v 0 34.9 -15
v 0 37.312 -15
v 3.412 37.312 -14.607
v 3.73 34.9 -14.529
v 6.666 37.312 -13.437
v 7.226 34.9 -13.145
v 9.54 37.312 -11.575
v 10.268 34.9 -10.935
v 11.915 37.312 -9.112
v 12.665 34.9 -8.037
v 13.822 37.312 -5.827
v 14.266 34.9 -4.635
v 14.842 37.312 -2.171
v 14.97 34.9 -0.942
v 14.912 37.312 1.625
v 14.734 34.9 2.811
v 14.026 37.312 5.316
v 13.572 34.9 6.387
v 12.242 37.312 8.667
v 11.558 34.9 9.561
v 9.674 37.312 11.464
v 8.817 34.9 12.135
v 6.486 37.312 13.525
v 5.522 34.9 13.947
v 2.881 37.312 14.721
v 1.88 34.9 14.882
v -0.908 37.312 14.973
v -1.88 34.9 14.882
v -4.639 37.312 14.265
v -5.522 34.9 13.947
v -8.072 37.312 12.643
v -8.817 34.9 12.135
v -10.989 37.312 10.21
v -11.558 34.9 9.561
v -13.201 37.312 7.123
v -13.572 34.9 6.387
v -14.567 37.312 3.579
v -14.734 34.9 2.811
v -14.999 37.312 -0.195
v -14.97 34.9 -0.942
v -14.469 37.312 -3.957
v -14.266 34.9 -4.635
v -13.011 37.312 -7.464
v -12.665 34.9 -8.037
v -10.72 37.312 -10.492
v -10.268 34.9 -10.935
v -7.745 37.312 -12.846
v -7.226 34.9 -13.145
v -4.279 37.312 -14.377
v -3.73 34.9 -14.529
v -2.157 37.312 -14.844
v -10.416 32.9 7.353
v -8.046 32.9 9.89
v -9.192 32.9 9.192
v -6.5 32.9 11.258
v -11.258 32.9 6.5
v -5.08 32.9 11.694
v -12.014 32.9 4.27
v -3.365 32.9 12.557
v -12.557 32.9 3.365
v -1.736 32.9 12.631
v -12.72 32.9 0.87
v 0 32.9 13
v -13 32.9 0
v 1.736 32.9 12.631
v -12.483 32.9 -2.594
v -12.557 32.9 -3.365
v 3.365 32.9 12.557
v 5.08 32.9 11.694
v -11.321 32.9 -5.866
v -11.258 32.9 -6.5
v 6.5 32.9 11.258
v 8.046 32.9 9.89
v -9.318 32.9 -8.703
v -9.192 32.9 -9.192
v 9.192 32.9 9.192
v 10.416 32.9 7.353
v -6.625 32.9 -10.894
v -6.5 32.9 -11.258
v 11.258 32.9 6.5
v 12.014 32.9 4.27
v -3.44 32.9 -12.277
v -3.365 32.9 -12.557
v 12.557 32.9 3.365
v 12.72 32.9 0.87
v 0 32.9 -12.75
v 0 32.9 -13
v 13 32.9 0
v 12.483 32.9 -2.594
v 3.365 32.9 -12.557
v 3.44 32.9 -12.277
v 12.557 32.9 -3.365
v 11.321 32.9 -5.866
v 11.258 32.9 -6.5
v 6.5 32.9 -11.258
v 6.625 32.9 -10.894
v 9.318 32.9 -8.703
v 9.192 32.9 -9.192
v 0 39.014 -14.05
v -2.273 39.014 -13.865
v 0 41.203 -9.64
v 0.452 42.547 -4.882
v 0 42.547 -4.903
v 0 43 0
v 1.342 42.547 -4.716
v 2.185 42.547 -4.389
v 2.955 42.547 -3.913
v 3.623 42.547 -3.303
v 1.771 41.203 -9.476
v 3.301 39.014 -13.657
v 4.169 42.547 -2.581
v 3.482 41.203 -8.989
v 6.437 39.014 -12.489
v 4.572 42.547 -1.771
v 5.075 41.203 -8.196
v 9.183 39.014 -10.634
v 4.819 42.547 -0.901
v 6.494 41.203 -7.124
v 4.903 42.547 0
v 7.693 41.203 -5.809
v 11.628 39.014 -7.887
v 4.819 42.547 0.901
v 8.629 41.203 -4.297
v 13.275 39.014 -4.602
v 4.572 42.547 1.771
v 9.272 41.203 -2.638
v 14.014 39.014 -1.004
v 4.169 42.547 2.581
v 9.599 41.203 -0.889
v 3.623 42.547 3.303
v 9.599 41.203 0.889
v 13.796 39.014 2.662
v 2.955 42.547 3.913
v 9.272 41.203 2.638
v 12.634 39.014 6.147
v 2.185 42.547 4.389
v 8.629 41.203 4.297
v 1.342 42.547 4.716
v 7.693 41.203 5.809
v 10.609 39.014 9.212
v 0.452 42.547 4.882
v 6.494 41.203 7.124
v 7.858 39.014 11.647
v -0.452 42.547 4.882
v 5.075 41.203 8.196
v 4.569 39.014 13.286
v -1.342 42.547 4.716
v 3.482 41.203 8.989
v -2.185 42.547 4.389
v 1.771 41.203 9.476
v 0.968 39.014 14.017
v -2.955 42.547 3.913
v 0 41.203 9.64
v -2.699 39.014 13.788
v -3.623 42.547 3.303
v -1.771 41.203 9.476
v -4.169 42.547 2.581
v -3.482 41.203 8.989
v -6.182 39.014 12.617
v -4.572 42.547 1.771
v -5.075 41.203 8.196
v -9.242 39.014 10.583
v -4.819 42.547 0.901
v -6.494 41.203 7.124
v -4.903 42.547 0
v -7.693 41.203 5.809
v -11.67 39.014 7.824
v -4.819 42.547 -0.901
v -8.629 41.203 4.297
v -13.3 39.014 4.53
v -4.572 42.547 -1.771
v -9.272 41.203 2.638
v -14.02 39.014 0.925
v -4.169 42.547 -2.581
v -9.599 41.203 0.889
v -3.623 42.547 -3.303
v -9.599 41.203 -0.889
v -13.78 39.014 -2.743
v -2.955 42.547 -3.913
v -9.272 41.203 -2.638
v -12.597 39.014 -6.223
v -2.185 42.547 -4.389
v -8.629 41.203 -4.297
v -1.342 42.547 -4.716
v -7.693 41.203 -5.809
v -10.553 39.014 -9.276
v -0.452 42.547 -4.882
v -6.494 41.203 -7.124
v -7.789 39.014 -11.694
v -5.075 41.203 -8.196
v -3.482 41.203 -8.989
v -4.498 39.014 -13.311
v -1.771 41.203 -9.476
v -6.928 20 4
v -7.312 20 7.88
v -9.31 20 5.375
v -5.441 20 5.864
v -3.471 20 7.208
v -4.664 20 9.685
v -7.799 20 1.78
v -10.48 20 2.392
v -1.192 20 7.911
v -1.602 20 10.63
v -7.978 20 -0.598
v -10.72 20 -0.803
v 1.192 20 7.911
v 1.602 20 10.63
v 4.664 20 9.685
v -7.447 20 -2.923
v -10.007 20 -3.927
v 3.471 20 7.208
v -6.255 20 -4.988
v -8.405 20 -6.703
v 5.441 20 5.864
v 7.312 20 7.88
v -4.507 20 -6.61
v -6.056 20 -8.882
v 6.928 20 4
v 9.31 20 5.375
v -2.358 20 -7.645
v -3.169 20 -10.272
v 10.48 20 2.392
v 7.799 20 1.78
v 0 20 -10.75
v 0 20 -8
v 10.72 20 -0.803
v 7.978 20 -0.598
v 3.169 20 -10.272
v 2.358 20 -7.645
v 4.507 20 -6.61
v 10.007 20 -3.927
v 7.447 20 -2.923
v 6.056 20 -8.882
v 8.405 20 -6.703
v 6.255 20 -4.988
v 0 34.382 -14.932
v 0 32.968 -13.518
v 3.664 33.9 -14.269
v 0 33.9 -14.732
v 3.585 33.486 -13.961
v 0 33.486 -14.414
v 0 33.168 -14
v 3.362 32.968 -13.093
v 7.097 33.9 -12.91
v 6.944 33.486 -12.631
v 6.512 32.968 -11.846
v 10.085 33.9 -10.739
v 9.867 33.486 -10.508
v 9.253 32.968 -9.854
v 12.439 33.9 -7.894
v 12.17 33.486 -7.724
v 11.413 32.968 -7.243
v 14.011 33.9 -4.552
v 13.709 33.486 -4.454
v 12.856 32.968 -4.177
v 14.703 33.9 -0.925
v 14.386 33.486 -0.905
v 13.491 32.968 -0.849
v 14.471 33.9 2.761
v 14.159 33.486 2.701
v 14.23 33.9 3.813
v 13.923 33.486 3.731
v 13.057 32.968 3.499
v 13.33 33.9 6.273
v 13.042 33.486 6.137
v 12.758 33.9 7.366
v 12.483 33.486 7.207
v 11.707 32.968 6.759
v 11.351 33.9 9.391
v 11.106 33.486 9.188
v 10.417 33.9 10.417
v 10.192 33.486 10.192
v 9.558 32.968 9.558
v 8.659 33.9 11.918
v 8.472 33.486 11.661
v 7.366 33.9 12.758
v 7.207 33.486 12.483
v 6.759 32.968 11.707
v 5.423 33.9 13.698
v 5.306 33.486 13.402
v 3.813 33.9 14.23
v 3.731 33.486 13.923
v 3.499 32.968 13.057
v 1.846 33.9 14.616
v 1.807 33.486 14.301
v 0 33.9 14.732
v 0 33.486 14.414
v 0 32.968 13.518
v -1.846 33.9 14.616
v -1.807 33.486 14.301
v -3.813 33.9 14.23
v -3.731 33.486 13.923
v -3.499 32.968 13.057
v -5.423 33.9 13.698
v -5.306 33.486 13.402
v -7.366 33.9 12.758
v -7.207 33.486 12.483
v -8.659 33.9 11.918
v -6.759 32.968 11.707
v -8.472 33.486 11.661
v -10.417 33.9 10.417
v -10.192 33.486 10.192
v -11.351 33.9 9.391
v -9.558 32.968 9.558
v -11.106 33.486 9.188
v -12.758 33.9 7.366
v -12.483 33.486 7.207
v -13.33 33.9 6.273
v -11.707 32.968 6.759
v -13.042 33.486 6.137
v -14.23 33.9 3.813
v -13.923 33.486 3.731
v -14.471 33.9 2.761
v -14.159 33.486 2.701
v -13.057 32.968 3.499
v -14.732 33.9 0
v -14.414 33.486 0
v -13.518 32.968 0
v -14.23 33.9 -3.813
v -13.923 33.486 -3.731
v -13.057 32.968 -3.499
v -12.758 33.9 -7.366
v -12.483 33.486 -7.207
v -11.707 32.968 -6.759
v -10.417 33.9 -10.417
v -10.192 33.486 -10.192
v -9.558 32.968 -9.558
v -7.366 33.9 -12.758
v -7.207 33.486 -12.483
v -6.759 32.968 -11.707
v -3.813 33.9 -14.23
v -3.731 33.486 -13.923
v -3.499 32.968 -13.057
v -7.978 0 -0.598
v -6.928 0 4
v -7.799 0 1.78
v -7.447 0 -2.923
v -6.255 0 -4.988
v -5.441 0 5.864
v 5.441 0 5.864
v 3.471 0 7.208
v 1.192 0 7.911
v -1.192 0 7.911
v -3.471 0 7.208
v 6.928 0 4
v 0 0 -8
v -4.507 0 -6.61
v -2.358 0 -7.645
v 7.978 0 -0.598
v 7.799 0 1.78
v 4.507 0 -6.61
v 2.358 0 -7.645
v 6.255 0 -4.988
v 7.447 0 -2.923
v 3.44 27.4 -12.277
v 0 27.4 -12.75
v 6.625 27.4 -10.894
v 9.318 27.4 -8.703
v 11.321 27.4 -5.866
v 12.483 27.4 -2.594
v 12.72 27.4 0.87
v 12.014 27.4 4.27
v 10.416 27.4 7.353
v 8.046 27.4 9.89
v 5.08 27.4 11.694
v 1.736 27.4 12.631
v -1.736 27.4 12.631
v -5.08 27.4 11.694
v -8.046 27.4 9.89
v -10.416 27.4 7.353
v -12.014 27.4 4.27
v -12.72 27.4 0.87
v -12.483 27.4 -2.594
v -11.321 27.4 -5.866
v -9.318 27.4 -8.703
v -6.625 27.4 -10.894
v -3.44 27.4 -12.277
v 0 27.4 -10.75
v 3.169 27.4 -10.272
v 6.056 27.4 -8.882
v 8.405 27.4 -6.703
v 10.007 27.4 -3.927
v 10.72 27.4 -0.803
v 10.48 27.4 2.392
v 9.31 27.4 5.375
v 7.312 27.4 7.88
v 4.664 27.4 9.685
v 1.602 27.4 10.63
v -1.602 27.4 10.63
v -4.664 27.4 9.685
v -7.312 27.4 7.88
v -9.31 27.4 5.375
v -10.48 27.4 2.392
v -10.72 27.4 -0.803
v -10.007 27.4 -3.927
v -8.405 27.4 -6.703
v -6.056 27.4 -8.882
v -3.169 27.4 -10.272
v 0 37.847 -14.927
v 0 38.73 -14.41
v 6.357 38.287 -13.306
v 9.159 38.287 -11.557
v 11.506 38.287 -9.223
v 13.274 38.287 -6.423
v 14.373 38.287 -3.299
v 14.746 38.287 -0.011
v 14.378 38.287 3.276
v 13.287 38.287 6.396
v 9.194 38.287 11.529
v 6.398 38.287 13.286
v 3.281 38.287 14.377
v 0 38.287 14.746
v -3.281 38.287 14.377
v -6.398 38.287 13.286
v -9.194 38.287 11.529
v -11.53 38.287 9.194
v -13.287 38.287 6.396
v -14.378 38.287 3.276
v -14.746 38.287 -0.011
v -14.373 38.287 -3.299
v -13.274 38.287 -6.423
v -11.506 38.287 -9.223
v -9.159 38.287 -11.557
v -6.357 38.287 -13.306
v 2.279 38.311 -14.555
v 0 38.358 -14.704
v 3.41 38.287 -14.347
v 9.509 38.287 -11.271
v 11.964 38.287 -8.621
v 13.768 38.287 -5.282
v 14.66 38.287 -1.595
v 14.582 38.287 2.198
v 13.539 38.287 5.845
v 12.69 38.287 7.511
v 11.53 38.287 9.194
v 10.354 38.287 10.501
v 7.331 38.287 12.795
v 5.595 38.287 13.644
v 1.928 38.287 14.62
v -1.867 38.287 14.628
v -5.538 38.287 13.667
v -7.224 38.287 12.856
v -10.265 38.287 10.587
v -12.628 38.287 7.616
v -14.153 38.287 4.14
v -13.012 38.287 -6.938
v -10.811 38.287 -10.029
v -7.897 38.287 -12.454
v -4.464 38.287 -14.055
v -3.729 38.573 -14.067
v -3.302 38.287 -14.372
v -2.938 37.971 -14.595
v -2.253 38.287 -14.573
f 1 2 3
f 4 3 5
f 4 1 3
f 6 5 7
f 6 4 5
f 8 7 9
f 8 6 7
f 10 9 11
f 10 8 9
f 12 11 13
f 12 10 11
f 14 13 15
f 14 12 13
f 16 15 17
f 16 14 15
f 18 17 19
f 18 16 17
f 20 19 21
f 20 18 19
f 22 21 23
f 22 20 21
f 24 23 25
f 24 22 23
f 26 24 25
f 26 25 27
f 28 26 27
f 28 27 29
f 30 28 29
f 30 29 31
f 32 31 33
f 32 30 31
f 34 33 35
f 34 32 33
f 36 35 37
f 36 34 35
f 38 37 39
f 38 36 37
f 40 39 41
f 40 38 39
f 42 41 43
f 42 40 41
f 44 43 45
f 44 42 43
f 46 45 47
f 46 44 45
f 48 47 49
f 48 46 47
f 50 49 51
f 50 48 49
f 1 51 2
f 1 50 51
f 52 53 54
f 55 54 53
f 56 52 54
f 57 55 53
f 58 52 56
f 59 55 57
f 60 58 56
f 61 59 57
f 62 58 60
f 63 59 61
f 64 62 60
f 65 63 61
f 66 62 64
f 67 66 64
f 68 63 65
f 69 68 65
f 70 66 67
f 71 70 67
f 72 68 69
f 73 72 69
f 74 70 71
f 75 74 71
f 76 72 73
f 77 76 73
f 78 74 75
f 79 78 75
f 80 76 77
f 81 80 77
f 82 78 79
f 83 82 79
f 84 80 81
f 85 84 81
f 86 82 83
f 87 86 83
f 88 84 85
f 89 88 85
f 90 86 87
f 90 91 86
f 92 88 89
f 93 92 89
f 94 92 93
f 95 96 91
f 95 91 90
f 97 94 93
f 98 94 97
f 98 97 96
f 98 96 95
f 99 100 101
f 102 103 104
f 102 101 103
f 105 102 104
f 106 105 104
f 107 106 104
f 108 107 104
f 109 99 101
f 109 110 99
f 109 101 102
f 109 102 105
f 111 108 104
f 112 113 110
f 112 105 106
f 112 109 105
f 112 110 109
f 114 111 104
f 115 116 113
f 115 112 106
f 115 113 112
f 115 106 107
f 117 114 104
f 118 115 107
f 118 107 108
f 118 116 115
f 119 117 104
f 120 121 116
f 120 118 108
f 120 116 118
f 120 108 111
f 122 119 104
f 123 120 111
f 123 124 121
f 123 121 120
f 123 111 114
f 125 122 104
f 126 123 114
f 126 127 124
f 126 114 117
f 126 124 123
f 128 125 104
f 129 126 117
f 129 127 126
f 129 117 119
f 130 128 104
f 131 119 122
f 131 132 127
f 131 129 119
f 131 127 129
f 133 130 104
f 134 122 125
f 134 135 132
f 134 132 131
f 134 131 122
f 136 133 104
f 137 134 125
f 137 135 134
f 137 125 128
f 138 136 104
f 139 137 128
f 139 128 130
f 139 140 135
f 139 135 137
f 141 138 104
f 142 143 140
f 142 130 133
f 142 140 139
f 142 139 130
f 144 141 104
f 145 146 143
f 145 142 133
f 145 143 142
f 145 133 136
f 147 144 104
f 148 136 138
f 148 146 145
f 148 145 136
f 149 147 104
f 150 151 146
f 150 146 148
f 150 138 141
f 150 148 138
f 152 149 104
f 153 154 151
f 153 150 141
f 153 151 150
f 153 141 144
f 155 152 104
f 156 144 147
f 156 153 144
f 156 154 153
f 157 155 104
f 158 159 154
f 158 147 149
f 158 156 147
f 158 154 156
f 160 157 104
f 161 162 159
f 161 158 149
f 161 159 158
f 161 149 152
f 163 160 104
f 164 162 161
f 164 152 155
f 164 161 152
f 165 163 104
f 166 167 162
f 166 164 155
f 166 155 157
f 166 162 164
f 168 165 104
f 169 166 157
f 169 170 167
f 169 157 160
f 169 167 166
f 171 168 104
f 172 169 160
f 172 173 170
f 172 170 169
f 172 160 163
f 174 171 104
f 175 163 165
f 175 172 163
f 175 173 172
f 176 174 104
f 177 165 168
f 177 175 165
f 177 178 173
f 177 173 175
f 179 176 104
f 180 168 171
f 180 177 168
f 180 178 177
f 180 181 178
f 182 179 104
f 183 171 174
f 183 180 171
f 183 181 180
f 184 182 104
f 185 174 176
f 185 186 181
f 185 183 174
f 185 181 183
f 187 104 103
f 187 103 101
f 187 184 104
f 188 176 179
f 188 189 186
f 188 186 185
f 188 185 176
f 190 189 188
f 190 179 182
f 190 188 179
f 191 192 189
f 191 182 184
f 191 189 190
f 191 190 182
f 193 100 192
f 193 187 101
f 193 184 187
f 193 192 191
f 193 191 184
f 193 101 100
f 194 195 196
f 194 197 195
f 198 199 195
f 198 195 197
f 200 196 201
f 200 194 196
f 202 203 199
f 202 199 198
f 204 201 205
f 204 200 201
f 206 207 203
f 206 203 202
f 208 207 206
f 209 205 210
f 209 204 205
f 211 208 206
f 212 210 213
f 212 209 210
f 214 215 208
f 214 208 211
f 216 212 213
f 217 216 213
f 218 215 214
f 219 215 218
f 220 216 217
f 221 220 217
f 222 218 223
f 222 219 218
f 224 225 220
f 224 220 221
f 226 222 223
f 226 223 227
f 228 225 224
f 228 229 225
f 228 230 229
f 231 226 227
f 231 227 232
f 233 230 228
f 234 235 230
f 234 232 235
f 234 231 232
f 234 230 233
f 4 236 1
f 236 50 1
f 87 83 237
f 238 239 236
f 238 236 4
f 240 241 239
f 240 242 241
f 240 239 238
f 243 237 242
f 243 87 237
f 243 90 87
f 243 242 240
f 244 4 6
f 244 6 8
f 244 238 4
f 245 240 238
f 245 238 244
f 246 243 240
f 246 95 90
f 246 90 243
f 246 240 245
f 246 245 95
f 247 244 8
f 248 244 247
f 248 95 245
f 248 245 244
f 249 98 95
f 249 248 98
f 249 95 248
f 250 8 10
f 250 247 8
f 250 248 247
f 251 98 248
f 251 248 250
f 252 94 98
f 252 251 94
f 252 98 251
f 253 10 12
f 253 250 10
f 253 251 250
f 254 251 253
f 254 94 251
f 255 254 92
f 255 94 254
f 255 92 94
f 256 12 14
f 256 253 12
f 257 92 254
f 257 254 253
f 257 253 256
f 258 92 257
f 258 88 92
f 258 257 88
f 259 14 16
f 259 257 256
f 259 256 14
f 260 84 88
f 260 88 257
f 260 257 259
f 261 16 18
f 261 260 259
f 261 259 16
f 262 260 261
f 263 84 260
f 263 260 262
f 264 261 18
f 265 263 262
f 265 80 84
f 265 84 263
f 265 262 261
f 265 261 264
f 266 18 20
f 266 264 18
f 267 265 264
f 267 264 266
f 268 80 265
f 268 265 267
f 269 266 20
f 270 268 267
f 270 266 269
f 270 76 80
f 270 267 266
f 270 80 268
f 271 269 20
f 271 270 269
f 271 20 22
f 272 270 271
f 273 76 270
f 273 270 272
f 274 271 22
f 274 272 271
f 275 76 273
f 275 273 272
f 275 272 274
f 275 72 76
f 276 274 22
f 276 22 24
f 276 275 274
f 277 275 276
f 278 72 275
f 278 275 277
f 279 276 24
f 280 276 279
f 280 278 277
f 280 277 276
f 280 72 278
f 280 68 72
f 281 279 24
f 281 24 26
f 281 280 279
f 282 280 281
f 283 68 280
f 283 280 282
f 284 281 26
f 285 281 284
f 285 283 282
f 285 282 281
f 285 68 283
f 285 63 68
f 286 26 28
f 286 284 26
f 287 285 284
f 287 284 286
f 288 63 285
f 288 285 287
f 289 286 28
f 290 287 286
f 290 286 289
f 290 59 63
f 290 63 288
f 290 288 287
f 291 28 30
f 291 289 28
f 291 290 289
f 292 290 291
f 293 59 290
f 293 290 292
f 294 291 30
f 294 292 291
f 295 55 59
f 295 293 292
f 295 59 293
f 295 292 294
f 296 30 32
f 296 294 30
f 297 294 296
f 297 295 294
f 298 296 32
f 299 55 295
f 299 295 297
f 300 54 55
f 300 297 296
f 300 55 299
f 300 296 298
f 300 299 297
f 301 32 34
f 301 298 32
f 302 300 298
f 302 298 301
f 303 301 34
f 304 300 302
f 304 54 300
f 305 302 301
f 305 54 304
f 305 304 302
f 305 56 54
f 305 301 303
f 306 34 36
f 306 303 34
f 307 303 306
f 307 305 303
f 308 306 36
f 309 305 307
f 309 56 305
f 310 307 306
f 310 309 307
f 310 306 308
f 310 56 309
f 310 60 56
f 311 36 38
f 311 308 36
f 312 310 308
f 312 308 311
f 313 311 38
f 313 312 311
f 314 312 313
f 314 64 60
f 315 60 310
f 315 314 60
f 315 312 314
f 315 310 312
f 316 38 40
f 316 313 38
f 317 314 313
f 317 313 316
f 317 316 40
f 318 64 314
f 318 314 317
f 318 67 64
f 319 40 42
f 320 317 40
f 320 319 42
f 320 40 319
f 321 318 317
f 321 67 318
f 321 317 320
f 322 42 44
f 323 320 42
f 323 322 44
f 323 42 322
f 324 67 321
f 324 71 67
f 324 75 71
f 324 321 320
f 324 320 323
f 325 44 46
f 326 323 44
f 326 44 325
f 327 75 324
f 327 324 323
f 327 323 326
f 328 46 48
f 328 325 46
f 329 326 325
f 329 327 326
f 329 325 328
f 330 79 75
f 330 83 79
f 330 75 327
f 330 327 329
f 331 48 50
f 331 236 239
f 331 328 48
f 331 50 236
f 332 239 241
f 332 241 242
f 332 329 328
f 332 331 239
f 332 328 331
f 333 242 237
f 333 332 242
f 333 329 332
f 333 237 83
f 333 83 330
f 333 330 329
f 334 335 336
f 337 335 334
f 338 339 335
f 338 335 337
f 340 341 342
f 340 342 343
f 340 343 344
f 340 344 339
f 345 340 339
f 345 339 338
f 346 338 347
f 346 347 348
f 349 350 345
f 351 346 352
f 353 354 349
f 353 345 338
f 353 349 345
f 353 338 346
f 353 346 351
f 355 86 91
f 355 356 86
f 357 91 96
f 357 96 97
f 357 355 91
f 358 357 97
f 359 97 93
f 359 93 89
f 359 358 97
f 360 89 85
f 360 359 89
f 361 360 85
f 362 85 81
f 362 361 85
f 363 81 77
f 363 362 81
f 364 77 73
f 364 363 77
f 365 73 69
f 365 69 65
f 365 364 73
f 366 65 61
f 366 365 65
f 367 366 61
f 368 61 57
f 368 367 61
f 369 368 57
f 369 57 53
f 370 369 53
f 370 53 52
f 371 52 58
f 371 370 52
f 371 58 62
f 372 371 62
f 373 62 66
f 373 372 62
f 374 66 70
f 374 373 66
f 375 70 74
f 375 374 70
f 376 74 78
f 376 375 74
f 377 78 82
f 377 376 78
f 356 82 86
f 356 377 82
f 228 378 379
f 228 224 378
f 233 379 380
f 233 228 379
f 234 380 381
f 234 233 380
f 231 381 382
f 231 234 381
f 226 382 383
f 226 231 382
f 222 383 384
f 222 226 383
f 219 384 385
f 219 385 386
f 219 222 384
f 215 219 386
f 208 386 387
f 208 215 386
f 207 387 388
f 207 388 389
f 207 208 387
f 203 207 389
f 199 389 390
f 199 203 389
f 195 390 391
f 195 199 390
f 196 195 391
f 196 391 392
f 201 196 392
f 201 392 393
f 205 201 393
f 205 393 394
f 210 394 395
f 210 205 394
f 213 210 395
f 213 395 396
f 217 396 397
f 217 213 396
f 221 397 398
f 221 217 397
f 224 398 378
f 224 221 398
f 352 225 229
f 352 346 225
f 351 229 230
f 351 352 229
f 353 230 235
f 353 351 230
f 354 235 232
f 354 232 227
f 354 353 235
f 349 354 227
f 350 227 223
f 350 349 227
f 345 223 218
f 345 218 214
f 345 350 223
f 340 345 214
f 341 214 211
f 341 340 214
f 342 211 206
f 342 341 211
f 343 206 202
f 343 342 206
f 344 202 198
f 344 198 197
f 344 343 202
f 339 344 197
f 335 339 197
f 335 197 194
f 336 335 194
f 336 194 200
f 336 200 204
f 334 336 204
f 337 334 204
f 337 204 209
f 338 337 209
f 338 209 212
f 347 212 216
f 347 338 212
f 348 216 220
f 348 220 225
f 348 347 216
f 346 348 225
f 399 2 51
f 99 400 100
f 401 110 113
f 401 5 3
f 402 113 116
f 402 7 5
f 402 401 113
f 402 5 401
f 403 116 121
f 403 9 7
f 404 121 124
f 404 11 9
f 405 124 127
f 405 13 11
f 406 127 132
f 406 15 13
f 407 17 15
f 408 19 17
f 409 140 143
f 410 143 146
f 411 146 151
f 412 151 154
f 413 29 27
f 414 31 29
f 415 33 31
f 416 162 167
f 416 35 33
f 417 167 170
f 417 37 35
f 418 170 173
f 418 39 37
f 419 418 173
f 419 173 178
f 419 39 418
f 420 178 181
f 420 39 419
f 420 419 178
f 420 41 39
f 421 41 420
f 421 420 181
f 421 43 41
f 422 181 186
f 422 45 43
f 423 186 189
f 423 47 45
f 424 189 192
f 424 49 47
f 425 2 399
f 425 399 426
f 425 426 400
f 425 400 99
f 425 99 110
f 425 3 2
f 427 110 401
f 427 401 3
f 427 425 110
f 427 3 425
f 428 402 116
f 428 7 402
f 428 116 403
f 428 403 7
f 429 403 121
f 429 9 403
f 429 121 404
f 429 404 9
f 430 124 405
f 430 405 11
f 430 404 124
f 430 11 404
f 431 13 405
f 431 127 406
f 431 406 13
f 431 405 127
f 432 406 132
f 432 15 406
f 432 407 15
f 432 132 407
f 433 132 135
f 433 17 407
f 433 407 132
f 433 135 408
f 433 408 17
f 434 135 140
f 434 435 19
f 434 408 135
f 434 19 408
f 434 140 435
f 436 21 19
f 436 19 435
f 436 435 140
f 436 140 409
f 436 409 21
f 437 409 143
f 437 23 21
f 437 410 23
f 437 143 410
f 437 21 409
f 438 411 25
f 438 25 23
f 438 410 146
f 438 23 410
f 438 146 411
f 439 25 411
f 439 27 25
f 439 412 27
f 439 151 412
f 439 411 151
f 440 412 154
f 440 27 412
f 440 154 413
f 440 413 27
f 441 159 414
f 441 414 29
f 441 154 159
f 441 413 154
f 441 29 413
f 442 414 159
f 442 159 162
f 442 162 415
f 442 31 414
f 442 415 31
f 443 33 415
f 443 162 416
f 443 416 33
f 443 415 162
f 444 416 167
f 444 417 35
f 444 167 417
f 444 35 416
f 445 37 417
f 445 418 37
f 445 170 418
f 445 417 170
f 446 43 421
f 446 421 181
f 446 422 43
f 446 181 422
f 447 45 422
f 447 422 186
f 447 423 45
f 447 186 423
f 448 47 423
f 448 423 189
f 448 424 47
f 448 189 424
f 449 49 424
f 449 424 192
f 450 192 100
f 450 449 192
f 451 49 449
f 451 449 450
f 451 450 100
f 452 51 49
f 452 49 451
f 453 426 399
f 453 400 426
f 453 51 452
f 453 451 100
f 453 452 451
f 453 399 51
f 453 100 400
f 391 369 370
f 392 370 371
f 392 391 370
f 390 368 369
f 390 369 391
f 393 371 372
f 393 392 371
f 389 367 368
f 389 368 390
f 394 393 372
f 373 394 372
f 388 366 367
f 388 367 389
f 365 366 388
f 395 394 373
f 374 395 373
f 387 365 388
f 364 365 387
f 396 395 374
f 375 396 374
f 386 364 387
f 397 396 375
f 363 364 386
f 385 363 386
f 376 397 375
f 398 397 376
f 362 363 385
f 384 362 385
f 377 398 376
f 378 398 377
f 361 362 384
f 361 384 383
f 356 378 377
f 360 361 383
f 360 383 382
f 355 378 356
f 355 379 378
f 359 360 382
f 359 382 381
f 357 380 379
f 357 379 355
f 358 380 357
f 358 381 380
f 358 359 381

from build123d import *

# Parameters (mm, degrees)
FILLET1_R = 2


with BuildPart() as part:
    # Sketch1 → Revolve1 (revolve)
    with BuildSketch(Plane(origin=(0, 0, 0), x_dir=(0, 0, -1), z_dir=(1, 0, 0))):
        with BuildLine():
            Line((15, 38.4), (15, 32.9))
            Line((15, 32.9), (12.75, 32.9))
            Line((12.75, 32.9), (12.75, 27.4))
            Line((12.75, 27.4), (10.75, 27.4))
            Line((10.75, 27.4), (10.75, 20))
            Line((10.75, 20), (8, 20))
            Line((8, 20), (8, 0))
            Line((8, 0), (0, 0))
            Line((0, 0), (0, 43))
            ThreePointArc((0, 43), (7.844743463, 41.824163466), (15, 38.4))
        make_face()
    revolve(axis=Axis((0, 43, 0), (0, -1, 0)))

    # Fillet1
    fillet1_edges = [part.edges().sort_by_distance(p)[0] for p in [
        (0, 32.9, 15),
        (0, 38.4, 15),
    ]]
    fillet(fillet1_edges, radius=FILLET1_R)


solid = part.part
